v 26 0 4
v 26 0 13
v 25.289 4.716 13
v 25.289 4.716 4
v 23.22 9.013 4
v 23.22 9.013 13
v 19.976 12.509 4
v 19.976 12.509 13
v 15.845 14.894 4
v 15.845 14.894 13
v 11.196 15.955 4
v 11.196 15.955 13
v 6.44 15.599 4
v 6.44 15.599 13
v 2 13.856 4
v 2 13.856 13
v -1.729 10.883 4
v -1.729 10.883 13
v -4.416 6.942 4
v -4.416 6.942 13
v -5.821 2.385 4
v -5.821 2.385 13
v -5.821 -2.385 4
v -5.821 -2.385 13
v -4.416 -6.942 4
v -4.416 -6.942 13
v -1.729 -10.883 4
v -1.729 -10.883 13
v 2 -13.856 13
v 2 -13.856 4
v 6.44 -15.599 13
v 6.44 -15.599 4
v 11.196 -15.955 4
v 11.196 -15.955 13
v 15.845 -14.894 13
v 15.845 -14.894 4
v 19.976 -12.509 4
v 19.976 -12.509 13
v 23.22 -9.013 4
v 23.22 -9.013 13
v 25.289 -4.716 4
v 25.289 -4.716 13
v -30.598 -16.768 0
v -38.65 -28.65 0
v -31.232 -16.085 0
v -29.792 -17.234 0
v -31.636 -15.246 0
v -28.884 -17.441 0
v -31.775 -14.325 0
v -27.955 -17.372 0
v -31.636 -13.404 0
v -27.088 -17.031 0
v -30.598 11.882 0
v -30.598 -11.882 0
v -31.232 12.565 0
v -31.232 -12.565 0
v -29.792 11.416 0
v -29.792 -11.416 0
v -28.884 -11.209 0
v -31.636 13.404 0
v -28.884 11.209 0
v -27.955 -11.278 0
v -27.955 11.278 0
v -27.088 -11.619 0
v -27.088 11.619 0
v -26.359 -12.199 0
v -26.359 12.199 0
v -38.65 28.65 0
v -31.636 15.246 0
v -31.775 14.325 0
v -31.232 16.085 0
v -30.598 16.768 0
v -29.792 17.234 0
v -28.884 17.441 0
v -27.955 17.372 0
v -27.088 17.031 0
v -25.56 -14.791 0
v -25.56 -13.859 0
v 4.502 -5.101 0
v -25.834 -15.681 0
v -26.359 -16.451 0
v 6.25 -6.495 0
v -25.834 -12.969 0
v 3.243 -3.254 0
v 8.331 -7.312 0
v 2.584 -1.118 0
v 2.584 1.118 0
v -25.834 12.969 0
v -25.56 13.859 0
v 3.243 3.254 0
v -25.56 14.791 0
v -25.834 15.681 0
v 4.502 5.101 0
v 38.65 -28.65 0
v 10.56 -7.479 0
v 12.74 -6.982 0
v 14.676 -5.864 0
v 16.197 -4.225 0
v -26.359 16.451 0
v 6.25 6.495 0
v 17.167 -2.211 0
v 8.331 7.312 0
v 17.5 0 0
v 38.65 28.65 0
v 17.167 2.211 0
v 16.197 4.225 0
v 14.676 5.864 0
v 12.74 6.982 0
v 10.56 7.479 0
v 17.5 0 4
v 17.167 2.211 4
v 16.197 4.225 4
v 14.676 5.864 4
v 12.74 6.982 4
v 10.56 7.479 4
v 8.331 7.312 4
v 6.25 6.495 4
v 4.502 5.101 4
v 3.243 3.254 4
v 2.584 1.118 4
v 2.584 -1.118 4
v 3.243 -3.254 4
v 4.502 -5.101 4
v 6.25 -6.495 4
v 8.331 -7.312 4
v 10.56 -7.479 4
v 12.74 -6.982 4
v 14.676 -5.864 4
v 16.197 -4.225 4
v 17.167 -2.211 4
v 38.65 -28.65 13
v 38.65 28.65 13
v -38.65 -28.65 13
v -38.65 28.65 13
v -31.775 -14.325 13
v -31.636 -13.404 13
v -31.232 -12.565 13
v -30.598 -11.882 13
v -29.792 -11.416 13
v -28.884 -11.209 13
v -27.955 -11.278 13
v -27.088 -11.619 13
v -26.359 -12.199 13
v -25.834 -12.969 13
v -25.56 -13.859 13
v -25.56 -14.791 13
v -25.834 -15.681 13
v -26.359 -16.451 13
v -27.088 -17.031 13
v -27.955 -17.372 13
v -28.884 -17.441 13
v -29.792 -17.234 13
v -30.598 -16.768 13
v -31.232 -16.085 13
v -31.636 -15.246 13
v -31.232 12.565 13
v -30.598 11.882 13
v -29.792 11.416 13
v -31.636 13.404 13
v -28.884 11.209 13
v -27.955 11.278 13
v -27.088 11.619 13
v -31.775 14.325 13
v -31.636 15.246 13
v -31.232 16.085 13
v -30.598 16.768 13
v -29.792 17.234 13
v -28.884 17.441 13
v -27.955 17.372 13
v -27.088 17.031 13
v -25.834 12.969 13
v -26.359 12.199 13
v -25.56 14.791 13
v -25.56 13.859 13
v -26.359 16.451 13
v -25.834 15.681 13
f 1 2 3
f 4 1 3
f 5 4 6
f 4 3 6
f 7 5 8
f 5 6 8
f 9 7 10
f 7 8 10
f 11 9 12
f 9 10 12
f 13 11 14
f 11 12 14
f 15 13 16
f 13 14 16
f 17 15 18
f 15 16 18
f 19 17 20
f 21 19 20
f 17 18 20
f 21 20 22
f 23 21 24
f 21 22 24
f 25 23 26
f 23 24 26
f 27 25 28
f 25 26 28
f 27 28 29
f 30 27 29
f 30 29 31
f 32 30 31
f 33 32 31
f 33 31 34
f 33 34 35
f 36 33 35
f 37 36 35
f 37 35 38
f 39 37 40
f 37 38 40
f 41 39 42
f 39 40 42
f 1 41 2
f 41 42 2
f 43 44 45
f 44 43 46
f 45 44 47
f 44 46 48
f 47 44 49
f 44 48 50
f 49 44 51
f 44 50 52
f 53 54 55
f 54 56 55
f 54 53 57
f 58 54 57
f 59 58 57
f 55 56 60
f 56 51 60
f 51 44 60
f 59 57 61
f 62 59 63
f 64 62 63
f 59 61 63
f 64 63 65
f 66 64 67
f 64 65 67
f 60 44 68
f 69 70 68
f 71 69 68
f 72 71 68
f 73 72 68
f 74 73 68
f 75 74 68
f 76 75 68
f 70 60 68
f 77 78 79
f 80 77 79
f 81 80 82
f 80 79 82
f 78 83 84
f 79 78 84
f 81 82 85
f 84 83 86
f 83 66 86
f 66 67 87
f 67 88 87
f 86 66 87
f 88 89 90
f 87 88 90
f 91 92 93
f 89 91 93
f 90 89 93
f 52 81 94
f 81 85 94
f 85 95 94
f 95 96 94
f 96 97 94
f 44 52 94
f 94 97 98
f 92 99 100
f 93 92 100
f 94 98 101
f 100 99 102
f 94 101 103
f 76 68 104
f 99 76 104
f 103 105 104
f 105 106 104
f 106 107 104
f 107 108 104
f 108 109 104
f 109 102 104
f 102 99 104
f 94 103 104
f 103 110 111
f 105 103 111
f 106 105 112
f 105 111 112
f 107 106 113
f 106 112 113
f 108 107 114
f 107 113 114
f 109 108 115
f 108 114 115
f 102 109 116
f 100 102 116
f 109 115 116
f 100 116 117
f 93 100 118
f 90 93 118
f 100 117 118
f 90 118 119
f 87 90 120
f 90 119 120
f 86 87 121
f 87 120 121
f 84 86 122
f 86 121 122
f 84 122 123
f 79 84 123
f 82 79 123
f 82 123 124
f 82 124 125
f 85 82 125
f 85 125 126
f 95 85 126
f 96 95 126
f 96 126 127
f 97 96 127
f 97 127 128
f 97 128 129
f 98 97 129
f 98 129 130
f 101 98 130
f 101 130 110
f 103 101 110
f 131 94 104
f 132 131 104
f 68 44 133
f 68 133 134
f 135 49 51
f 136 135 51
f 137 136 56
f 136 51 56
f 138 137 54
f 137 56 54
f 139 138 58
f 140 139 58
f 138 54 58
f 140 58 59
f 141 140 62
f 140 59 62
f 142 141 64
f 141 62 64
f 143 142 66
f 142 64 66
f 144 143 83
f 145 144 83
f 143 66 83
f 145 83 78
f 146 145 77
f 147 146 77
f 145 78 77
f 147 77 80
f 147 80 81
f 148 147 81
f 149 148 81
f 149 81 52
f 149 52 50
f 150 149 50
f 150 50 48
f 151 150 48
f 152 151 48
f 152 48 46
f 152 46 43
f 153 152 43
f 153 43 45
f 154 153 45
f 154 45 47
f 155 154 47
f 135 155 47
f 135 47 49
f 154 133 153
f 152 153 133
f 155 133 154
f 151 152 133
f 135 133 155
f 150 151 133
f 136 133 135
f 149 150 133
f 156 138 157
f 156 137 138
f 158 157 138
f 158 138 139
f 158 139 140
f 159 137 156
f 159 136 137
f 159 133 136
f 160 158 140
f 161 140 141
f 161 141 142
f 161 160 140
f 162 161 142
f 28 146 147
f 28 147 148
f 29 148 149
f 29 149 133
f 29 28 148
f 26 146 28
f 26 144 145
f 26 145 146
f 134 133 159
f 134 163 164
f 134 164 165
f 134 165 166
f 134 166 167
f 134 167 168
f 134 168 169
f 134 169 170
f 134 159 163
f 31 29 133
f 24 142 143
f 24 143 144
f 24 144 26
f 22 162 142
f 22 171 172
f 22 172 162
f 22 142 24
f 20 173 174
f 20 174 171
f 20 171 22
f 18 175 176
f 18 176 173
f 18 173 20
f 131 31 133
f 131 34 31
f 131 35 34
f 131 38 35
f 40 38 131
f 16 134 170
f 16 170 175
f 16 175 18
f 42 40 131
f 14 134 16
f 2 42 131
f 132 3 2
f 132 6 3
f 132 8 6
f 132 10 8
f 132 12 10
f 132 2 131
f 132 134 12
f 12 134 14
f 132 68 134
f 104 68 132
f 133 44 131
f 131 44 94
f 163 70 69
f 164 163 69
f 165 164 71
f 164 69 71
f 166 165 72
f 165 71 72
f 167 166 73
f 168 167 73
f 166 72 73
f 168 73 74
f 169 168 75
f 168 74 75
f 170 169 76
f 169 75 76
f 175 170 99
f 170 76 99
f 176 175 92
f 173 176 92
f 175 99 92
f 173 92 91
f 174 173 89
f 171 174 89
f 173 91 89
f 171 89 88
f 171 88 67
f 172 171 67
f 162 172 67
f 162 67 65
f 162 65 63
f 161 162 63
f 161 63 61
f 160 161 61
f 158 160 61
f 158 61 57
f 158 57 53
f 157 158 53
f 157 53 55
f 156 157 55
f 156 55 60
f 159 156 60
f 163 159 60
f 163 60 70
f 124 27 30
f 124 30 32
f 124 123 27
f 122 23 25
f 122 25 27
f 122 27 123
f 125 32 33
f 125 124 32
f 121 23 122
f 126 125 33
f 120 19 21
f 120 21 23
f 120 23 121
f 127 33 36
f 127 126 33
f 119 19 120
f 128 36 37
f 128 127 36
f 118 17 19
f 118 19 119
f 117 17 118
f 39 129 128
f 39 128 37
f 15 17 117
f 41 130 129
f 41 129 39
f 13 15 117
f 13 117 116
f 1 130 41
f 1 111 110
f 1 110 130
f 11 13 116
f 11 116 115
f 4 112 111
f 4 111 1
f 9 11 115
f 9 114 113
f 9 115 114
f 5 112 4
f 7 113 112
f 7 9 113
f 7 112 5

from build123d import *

# Parameters (mm, degrees)
SKETCH1_W                        = 77.3
SKETCH1_H                        = 57.3
BOSS_EXTRUDE1_DEPTH              = 13
TAP_DRILL_FOR_M6_HELICOIL1_D     = 6.25
TAP_DRILL_FOR_M6_HELICOIL1_DEPTH = 20
TAP_DRILL_FOR_M6_HELICOIL1_TIP   = 1.877689434
SKETCH2_R                        = 16
CUT_EXTRUDE1_DEPTH               = 9
SKETCH6_R                        = 7.5
CUT_EXTRUDE2_DEPTH               = 9


with BuildPart() as part:
    # Sketch1 → Boss-Extrude1 (new body)
    with BuildSketch(Plane.XY):
        Rectangle(SKETCH1_W, SKETCH1_H)
    extrude(amount=BOSS_EXTRUDE1_DEPTH)

    # Tap Drill for M6 Helicoil1
    with Locations(Plane(origin=(-28.65, 14.325, 13), x_dir=(1, 0, 0), z_dir=(0, 0, 1))):
        with Locations((0, 0), (0, -28.65)):
            Hole(TAP_DRILL_FOR_M6_HELICOIL1_D / 2, depth=TAP_DRILL_FOR_M6_HELICOIL1_DEPTH)
            with Locations((0, 0, -(TAP_DRILL_FOR_M6_HELICOIL1_DEPTH + TAP_DRILL_FOR_M6_HELICOIL1_TIP / 2))):  # 118° drill point
                Cone(0, TAP_DRILL_FOR_M6_HELICOIL1_D / 2, TAP_DRILL_FOR_M6_HELICOIL1_TIP, mode=Mode.SUBTRACT)

    # Sketch2 → Cut-Extrude1 (cut)
    with BuildSketch(Plane.XY.offset(13)):
        with Locations((10, 0)):
            Circle(SKETCH2_R)
    extrude(amount=-CUT_EXTRUDE1_DEPTH, mode=Mode.SUBTRACT)

    # Sketch6 → Cut-Extrude2 (cut)
    with BuildSketch(Plane.XY.offset(4)):
        with Locations((10, 0)):
            Circle(SKETCH6_R)
    extrude(amount=-CUT_EXTRUDE2_DEPTH, mode=Mode.SUBTRACT)


solid = part.part
